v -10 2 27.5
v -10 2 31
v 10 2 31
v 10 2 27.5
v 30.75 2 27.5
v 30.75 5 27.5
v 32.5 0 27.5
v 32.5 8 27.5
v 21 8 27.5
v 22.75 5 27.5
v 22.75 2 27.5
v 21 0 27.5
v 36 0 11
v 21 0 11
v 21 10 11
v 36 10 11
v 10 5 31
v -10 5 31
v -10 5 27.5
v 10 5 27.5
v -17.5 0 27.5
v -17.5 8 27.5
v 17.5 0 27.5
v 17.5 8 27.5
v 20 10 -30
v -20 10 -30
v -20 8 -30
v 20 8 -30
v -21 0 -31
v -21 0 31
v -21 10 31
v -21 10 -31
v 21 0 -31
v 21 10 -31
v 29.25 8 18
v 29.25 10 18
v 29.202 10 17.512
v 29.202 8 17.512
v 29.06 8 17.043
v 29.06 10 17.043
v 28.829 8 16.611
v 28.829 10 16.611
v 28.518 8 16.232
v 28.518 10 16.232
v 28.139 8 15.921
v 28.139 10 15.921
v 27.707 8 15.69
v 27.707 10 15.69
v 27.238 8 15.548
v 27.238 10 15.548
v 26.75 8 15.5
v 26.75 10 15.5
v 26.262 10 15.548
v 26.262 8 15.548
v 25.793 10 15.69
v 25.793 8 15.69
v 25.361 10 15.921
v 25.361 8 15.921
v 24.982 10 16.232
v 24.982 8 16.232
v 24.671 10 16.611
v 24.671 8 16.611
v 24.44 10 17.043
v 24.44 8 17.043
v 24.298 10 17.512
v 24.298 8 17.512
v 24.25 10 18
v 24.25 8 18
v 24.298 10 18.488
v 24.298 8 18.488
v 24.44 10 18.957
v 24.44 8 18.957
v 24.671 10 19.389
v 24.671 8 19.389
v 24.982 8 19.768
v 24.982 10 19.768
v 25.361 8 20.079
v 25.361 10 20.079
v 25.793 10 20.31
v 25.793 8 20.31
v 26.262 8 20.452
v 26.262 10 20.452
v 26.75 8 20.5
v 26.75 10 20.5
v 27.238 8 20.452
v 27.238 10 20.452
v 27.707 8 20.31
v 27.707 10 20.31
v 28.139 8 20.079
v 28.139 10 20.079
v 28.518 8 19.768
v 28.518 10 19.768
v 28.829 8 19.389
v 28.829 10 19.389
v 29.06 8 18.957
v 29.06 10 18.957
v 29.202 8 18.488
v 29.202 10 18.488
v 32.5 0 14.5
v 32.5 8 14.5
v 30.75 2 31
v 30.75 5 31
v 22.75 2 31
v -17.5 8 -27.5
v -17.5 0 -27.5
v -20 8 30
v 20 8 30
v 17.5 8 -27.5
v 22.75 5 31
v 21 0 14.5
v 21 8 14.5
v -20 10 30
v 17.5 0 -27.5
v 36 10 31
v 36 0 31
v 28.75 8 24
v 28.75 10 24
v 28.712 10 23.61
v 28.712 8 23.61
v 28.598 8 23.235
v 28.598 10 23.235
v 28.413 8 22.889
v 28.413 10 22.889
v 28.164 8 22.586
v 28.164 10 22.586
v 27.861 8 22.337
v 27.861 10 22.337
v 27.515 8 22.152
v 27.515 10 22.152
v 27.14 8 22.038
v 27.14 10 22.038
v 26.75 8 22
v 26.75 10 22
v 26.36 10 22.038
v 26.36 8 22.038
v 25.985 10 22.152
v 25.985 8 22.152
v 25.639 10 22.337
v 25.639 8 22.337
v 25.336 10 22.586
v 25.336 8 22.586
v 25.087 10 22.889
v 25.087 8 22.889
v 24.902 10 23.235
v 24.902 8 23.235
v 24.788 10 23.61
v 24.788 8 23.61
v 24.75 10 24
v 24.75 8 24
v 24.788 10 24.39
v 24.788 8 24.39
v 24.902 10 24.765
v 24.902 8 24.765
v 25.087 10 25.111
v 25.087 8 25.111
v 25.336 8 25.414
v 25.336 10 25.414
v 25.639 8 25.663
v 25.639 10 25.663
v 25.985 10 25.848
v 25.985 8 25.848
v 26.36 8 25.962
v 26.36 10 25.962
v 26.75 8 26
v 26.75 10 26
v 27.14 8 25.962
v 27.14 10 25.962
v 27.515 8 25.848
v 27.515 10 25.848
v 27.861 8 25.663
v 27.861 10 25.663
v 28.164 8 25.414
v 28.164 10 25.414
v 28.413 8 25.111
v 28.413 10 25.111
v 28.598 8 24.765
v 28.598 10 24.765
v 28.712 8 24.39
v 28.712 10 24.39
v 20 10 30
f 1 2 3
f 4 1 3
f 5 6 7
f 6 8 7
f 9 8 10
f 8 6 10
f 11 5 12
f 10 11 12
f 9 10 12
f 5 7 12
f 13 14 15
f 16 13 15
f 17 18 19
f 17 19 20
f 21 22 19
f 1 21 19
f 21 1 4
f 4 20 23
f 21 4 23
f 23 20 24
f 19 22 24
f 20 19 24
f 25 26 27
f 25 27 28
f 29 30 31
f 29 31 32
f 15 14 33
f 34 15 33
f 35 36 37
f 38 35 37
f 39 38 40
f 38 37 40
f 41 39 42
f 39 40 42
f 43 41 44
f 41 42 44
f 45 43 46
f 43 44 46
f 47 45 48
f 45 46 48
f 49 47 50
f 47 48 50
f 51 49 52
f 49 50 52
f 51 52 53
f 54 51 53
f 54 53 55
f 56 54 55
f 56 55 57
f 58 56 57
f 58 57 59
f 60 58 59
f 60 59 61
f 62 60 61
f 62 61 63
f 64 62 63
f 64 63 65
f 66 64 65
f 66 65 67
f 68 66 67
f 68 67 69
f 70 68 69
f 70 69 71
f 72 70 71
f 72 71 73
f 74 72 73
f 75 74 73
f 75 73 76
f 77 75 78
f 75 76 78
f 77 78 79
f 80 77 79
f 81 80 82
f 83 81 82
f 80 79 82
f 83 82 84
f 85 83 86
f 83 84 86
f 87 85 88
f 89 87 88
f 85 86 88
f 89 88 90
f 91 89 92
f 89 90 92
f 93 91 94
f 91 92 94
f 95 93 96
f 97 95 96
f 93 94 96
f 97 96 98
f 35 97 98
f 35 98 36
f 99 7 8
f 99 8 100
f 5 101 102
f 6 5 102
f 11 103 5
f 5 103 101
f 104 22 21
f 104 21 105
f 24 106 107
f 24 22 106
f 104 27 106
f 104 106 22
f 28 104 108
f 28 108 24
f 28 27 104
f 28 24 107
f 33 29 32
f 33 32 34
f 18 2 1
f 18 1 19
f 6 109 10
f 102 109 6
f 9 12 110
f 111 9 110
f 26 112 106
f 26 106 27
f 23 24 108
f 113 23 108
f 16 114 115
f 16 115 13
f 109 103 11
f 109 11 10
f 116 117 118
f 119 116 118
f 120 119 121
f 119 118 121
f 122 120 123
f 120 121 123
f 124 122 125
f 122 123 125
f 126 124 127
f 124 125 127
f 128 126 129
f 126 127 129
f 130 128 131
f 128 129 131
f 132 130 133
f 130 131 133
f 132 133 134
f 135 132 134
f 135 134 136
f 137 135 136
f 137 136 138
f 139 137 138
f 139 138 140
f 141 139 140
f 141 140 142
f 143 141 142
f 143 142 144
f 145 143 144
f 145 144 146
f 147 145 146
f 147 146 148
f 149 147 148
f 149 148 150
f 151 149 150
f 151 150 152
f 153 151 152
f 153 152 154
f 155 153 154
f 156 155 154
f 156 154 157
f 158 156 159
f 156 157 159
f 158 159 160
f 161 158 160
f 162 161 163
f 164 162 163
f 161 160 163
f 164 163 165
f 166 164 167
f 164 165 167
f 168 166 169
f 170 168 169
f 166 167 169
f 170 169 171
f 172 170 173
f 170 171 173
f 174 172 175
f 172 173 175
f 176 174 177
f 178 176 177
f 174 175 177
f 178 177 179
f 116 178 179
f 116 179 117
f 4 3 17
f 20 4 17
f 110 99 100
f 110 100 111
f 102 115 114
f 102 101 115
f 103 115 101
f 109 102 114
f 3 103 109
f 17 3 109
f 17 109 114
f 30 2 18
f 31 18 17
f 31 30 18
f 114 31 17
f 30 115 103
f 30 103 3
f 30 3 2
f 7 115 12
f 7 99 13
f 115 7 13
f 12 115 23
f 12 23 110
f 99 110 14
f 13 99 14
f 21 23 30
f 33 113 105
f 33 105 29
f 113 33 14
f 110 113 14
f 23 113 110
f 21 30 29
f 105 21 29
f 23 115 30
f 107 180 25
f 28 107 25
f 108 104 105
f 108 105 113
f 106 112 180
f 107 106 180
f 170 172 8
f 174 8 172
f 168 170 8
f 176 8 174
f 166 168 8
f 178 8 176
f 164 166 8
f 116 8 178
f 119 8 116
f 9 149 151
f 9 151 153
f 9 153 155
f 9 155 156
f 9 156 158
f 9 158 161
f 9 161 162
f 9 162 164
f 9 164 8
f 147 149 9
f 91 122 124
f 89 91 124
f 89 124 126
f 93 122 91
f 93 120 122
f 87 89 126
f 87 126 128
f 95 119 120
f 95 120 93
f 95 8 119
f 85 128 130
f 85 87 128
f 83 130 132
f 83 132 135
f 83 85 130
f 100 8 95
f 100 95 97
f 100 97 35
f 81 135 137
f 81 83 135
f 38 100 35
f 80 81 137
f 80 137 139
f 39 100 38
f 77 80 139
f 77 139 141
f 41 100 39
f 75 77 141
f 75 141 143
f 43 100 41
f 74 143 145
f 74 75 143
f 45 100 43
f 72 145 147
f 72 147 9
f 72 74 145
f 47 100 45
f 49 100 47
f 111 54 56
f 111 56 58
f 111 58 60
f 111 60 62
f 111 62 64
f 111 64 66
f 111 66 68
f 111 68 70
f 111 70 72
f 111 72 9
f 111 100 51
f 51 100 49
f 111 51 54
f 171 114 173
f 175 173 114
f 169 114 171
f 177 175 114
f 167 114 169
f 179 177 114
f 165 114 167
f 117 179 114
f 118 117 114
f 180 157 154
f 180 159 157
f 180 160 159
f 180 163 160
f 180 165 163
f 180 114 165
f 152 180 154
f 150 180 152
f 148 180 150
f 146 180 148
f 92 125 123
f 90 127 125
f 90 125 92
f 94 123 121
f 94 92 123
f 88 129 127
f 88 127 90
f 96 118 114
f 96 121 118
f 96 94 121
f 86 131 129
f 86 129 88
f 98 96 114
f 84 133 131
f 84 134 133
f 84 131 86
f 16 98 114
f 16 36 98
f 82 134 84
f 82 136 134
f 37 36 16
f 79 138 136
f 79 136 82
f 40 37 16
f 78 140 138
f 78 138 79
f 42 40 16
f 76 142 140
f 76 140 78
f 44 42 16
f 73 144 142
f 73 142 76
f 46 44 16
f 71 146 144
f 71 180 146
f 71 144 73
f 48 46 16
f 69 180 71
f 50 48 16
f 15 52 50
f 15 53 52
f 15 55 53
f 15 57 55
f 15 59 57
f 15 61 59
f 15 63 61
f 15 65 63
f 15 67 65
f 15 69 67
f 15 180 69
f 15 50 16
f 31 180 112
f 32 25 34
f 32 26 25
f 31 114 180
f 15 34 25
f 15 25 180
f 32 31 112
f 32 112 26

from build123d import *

# Parameters (mm, degrees)
CROQUIS1_W              = 42
CROQUIS1_H              = 62
SALIENTE_EXTRUIR1_DEPTH = 10
CROQUIS2_W              = 40
CROQUIS2_H              = 60
CORTAR_EXTRUIR1_DEPTH   = 2
CROQUIS3_W              = 35
CROQUIS3_H              = 55
CORTAR_EXTRUIR2_DEPTH   = 8
CROQUIS4_W              = 20
CROQUIS4_H              = 3
CORTAR_EXTRUIR3_DEPTH   = 8
CROQUIS5_W              = 20
CROQUIS5_H              = 10
SALIENTE_EXTRUIR2_DEPTH = 15
CROQUIS6_W              = 11.5
CROQUIS6_H              = 13
CORTAR_EXTRUIR4_DEPTH   = 8
CROQUIS7_R              = 2.5
CROQUIS7_R_2            = 2
CORTAR_EXTRUIR5_DEPTH   = 8
CROQUIS8_W              = 8
CROQUIS8_H              = 3
CORTAR_EXTRUIR6_DEPTH   = 8


with BuildPart() as part:
    # Croquis1 → Saliente-Extruir1 (new body)
    with BuildSketch(Plane(origin=(0, 0, 0), x_dir=(1, 0, 0), z_dir=(0, 1, 0))):
        Rectangle(CROQUIS1_W, CROQUIS1_H)
    extrude(amount=SALIENTE_EXTRUIR1_DEPTH)

    # Croquis2 → Cortar-Extruir1 (cut)
    with BuildSketch(Plane(origin=(0, 10, 0), x_dir=(1, 0, 0), z_dir=(0, 1, 0))):
        Rectangle(CROQUIS2_W, CROQUIS2_H)
    extrude(amount=-CORTAR_EXTRUIR1_DEPTH, mode=Mode.SUBTRACT)

    # Croquis3 → Cortar-Extruir2 (cut)
    with BuildSketch(Plane(origin=(0, 8, 0), x_dir=(1, 0, 0), z_dir=(0, 1, 0))):
        Rectangle(CROQUIS3_W, CROQUIS3_H)
    extrude(amount=-CORTAR_EXTRUIR2_DEPTH, mode=Mode.SUBTRACT)

    # Croquis4 → Cortar-Extruir3 (cut)
    with BuildSketch(Plane.XY.offset(31)):
        with Locations((0, 3.5)):
            Rectangle(CROQUIS4_W, CROQUIS4_H)
    extrude(amount=-CORTAR_EXTRUIR3_DEPTH, mode=Mode.SUBTRACT)

    # Croquis5 → Saliente-Extruir2 (add)
    with BuildSketch(Plane(origin=(21, 0, 0), x_dir=(0, 0, -1), z_dir=(1, 0, 0))):
        with Locations((-21, 5)):
            Rectangle(CROQUIS5_W, CROQUIS5_H)
    extrude(amount=SALIENTE_EXTRUIR2_DEPTH)

    # Croquis6 → Cortar-Extruir4 (cut)
    with BuildSketch(Plane(origin=(0, 0, 0), x_dir=(-1, 0, 0), z_dir=(0, -1, 0))):
        with Locations((-26.75, -21)):
            Rectangle(CROQUIS6_W, CROQUIS6_H)
    extrude(amount=-CORTAR_EXTRUIR4_DEPTH, mode=Mode.SUBTRACT)

    # Croquis7 → Cortar-Extruir5 (cut)
    with BuildSketch(Plane(origin=(0, 10, 0), x_dir=(1, 0, 0), z_dir=(0, 1, 0))):
        with Locations((26.75, -18)):
            Circle(CROQUIS7_R)
        with Locations((26.75, -24)):
            Circle(CROQUIS7_R_2)
    extrude(amount=-CORTAR_EXTRUIR5_DEPTH, mode=Mode.SUBTRACT)

    # Croquis8 → Cortar-Extruir6 (cut)
    with BuildSketch(Plane.XY.offset(31)):
        with Locations((26.75, 3.5)):
            Rectangle(CROQUIS8_W, CROQUIS8_H)
    extrude(amount=-CORTAR_EXTRUIR6_DEPTH, mode=Mode.SUBTRACT)


solid = part.part
